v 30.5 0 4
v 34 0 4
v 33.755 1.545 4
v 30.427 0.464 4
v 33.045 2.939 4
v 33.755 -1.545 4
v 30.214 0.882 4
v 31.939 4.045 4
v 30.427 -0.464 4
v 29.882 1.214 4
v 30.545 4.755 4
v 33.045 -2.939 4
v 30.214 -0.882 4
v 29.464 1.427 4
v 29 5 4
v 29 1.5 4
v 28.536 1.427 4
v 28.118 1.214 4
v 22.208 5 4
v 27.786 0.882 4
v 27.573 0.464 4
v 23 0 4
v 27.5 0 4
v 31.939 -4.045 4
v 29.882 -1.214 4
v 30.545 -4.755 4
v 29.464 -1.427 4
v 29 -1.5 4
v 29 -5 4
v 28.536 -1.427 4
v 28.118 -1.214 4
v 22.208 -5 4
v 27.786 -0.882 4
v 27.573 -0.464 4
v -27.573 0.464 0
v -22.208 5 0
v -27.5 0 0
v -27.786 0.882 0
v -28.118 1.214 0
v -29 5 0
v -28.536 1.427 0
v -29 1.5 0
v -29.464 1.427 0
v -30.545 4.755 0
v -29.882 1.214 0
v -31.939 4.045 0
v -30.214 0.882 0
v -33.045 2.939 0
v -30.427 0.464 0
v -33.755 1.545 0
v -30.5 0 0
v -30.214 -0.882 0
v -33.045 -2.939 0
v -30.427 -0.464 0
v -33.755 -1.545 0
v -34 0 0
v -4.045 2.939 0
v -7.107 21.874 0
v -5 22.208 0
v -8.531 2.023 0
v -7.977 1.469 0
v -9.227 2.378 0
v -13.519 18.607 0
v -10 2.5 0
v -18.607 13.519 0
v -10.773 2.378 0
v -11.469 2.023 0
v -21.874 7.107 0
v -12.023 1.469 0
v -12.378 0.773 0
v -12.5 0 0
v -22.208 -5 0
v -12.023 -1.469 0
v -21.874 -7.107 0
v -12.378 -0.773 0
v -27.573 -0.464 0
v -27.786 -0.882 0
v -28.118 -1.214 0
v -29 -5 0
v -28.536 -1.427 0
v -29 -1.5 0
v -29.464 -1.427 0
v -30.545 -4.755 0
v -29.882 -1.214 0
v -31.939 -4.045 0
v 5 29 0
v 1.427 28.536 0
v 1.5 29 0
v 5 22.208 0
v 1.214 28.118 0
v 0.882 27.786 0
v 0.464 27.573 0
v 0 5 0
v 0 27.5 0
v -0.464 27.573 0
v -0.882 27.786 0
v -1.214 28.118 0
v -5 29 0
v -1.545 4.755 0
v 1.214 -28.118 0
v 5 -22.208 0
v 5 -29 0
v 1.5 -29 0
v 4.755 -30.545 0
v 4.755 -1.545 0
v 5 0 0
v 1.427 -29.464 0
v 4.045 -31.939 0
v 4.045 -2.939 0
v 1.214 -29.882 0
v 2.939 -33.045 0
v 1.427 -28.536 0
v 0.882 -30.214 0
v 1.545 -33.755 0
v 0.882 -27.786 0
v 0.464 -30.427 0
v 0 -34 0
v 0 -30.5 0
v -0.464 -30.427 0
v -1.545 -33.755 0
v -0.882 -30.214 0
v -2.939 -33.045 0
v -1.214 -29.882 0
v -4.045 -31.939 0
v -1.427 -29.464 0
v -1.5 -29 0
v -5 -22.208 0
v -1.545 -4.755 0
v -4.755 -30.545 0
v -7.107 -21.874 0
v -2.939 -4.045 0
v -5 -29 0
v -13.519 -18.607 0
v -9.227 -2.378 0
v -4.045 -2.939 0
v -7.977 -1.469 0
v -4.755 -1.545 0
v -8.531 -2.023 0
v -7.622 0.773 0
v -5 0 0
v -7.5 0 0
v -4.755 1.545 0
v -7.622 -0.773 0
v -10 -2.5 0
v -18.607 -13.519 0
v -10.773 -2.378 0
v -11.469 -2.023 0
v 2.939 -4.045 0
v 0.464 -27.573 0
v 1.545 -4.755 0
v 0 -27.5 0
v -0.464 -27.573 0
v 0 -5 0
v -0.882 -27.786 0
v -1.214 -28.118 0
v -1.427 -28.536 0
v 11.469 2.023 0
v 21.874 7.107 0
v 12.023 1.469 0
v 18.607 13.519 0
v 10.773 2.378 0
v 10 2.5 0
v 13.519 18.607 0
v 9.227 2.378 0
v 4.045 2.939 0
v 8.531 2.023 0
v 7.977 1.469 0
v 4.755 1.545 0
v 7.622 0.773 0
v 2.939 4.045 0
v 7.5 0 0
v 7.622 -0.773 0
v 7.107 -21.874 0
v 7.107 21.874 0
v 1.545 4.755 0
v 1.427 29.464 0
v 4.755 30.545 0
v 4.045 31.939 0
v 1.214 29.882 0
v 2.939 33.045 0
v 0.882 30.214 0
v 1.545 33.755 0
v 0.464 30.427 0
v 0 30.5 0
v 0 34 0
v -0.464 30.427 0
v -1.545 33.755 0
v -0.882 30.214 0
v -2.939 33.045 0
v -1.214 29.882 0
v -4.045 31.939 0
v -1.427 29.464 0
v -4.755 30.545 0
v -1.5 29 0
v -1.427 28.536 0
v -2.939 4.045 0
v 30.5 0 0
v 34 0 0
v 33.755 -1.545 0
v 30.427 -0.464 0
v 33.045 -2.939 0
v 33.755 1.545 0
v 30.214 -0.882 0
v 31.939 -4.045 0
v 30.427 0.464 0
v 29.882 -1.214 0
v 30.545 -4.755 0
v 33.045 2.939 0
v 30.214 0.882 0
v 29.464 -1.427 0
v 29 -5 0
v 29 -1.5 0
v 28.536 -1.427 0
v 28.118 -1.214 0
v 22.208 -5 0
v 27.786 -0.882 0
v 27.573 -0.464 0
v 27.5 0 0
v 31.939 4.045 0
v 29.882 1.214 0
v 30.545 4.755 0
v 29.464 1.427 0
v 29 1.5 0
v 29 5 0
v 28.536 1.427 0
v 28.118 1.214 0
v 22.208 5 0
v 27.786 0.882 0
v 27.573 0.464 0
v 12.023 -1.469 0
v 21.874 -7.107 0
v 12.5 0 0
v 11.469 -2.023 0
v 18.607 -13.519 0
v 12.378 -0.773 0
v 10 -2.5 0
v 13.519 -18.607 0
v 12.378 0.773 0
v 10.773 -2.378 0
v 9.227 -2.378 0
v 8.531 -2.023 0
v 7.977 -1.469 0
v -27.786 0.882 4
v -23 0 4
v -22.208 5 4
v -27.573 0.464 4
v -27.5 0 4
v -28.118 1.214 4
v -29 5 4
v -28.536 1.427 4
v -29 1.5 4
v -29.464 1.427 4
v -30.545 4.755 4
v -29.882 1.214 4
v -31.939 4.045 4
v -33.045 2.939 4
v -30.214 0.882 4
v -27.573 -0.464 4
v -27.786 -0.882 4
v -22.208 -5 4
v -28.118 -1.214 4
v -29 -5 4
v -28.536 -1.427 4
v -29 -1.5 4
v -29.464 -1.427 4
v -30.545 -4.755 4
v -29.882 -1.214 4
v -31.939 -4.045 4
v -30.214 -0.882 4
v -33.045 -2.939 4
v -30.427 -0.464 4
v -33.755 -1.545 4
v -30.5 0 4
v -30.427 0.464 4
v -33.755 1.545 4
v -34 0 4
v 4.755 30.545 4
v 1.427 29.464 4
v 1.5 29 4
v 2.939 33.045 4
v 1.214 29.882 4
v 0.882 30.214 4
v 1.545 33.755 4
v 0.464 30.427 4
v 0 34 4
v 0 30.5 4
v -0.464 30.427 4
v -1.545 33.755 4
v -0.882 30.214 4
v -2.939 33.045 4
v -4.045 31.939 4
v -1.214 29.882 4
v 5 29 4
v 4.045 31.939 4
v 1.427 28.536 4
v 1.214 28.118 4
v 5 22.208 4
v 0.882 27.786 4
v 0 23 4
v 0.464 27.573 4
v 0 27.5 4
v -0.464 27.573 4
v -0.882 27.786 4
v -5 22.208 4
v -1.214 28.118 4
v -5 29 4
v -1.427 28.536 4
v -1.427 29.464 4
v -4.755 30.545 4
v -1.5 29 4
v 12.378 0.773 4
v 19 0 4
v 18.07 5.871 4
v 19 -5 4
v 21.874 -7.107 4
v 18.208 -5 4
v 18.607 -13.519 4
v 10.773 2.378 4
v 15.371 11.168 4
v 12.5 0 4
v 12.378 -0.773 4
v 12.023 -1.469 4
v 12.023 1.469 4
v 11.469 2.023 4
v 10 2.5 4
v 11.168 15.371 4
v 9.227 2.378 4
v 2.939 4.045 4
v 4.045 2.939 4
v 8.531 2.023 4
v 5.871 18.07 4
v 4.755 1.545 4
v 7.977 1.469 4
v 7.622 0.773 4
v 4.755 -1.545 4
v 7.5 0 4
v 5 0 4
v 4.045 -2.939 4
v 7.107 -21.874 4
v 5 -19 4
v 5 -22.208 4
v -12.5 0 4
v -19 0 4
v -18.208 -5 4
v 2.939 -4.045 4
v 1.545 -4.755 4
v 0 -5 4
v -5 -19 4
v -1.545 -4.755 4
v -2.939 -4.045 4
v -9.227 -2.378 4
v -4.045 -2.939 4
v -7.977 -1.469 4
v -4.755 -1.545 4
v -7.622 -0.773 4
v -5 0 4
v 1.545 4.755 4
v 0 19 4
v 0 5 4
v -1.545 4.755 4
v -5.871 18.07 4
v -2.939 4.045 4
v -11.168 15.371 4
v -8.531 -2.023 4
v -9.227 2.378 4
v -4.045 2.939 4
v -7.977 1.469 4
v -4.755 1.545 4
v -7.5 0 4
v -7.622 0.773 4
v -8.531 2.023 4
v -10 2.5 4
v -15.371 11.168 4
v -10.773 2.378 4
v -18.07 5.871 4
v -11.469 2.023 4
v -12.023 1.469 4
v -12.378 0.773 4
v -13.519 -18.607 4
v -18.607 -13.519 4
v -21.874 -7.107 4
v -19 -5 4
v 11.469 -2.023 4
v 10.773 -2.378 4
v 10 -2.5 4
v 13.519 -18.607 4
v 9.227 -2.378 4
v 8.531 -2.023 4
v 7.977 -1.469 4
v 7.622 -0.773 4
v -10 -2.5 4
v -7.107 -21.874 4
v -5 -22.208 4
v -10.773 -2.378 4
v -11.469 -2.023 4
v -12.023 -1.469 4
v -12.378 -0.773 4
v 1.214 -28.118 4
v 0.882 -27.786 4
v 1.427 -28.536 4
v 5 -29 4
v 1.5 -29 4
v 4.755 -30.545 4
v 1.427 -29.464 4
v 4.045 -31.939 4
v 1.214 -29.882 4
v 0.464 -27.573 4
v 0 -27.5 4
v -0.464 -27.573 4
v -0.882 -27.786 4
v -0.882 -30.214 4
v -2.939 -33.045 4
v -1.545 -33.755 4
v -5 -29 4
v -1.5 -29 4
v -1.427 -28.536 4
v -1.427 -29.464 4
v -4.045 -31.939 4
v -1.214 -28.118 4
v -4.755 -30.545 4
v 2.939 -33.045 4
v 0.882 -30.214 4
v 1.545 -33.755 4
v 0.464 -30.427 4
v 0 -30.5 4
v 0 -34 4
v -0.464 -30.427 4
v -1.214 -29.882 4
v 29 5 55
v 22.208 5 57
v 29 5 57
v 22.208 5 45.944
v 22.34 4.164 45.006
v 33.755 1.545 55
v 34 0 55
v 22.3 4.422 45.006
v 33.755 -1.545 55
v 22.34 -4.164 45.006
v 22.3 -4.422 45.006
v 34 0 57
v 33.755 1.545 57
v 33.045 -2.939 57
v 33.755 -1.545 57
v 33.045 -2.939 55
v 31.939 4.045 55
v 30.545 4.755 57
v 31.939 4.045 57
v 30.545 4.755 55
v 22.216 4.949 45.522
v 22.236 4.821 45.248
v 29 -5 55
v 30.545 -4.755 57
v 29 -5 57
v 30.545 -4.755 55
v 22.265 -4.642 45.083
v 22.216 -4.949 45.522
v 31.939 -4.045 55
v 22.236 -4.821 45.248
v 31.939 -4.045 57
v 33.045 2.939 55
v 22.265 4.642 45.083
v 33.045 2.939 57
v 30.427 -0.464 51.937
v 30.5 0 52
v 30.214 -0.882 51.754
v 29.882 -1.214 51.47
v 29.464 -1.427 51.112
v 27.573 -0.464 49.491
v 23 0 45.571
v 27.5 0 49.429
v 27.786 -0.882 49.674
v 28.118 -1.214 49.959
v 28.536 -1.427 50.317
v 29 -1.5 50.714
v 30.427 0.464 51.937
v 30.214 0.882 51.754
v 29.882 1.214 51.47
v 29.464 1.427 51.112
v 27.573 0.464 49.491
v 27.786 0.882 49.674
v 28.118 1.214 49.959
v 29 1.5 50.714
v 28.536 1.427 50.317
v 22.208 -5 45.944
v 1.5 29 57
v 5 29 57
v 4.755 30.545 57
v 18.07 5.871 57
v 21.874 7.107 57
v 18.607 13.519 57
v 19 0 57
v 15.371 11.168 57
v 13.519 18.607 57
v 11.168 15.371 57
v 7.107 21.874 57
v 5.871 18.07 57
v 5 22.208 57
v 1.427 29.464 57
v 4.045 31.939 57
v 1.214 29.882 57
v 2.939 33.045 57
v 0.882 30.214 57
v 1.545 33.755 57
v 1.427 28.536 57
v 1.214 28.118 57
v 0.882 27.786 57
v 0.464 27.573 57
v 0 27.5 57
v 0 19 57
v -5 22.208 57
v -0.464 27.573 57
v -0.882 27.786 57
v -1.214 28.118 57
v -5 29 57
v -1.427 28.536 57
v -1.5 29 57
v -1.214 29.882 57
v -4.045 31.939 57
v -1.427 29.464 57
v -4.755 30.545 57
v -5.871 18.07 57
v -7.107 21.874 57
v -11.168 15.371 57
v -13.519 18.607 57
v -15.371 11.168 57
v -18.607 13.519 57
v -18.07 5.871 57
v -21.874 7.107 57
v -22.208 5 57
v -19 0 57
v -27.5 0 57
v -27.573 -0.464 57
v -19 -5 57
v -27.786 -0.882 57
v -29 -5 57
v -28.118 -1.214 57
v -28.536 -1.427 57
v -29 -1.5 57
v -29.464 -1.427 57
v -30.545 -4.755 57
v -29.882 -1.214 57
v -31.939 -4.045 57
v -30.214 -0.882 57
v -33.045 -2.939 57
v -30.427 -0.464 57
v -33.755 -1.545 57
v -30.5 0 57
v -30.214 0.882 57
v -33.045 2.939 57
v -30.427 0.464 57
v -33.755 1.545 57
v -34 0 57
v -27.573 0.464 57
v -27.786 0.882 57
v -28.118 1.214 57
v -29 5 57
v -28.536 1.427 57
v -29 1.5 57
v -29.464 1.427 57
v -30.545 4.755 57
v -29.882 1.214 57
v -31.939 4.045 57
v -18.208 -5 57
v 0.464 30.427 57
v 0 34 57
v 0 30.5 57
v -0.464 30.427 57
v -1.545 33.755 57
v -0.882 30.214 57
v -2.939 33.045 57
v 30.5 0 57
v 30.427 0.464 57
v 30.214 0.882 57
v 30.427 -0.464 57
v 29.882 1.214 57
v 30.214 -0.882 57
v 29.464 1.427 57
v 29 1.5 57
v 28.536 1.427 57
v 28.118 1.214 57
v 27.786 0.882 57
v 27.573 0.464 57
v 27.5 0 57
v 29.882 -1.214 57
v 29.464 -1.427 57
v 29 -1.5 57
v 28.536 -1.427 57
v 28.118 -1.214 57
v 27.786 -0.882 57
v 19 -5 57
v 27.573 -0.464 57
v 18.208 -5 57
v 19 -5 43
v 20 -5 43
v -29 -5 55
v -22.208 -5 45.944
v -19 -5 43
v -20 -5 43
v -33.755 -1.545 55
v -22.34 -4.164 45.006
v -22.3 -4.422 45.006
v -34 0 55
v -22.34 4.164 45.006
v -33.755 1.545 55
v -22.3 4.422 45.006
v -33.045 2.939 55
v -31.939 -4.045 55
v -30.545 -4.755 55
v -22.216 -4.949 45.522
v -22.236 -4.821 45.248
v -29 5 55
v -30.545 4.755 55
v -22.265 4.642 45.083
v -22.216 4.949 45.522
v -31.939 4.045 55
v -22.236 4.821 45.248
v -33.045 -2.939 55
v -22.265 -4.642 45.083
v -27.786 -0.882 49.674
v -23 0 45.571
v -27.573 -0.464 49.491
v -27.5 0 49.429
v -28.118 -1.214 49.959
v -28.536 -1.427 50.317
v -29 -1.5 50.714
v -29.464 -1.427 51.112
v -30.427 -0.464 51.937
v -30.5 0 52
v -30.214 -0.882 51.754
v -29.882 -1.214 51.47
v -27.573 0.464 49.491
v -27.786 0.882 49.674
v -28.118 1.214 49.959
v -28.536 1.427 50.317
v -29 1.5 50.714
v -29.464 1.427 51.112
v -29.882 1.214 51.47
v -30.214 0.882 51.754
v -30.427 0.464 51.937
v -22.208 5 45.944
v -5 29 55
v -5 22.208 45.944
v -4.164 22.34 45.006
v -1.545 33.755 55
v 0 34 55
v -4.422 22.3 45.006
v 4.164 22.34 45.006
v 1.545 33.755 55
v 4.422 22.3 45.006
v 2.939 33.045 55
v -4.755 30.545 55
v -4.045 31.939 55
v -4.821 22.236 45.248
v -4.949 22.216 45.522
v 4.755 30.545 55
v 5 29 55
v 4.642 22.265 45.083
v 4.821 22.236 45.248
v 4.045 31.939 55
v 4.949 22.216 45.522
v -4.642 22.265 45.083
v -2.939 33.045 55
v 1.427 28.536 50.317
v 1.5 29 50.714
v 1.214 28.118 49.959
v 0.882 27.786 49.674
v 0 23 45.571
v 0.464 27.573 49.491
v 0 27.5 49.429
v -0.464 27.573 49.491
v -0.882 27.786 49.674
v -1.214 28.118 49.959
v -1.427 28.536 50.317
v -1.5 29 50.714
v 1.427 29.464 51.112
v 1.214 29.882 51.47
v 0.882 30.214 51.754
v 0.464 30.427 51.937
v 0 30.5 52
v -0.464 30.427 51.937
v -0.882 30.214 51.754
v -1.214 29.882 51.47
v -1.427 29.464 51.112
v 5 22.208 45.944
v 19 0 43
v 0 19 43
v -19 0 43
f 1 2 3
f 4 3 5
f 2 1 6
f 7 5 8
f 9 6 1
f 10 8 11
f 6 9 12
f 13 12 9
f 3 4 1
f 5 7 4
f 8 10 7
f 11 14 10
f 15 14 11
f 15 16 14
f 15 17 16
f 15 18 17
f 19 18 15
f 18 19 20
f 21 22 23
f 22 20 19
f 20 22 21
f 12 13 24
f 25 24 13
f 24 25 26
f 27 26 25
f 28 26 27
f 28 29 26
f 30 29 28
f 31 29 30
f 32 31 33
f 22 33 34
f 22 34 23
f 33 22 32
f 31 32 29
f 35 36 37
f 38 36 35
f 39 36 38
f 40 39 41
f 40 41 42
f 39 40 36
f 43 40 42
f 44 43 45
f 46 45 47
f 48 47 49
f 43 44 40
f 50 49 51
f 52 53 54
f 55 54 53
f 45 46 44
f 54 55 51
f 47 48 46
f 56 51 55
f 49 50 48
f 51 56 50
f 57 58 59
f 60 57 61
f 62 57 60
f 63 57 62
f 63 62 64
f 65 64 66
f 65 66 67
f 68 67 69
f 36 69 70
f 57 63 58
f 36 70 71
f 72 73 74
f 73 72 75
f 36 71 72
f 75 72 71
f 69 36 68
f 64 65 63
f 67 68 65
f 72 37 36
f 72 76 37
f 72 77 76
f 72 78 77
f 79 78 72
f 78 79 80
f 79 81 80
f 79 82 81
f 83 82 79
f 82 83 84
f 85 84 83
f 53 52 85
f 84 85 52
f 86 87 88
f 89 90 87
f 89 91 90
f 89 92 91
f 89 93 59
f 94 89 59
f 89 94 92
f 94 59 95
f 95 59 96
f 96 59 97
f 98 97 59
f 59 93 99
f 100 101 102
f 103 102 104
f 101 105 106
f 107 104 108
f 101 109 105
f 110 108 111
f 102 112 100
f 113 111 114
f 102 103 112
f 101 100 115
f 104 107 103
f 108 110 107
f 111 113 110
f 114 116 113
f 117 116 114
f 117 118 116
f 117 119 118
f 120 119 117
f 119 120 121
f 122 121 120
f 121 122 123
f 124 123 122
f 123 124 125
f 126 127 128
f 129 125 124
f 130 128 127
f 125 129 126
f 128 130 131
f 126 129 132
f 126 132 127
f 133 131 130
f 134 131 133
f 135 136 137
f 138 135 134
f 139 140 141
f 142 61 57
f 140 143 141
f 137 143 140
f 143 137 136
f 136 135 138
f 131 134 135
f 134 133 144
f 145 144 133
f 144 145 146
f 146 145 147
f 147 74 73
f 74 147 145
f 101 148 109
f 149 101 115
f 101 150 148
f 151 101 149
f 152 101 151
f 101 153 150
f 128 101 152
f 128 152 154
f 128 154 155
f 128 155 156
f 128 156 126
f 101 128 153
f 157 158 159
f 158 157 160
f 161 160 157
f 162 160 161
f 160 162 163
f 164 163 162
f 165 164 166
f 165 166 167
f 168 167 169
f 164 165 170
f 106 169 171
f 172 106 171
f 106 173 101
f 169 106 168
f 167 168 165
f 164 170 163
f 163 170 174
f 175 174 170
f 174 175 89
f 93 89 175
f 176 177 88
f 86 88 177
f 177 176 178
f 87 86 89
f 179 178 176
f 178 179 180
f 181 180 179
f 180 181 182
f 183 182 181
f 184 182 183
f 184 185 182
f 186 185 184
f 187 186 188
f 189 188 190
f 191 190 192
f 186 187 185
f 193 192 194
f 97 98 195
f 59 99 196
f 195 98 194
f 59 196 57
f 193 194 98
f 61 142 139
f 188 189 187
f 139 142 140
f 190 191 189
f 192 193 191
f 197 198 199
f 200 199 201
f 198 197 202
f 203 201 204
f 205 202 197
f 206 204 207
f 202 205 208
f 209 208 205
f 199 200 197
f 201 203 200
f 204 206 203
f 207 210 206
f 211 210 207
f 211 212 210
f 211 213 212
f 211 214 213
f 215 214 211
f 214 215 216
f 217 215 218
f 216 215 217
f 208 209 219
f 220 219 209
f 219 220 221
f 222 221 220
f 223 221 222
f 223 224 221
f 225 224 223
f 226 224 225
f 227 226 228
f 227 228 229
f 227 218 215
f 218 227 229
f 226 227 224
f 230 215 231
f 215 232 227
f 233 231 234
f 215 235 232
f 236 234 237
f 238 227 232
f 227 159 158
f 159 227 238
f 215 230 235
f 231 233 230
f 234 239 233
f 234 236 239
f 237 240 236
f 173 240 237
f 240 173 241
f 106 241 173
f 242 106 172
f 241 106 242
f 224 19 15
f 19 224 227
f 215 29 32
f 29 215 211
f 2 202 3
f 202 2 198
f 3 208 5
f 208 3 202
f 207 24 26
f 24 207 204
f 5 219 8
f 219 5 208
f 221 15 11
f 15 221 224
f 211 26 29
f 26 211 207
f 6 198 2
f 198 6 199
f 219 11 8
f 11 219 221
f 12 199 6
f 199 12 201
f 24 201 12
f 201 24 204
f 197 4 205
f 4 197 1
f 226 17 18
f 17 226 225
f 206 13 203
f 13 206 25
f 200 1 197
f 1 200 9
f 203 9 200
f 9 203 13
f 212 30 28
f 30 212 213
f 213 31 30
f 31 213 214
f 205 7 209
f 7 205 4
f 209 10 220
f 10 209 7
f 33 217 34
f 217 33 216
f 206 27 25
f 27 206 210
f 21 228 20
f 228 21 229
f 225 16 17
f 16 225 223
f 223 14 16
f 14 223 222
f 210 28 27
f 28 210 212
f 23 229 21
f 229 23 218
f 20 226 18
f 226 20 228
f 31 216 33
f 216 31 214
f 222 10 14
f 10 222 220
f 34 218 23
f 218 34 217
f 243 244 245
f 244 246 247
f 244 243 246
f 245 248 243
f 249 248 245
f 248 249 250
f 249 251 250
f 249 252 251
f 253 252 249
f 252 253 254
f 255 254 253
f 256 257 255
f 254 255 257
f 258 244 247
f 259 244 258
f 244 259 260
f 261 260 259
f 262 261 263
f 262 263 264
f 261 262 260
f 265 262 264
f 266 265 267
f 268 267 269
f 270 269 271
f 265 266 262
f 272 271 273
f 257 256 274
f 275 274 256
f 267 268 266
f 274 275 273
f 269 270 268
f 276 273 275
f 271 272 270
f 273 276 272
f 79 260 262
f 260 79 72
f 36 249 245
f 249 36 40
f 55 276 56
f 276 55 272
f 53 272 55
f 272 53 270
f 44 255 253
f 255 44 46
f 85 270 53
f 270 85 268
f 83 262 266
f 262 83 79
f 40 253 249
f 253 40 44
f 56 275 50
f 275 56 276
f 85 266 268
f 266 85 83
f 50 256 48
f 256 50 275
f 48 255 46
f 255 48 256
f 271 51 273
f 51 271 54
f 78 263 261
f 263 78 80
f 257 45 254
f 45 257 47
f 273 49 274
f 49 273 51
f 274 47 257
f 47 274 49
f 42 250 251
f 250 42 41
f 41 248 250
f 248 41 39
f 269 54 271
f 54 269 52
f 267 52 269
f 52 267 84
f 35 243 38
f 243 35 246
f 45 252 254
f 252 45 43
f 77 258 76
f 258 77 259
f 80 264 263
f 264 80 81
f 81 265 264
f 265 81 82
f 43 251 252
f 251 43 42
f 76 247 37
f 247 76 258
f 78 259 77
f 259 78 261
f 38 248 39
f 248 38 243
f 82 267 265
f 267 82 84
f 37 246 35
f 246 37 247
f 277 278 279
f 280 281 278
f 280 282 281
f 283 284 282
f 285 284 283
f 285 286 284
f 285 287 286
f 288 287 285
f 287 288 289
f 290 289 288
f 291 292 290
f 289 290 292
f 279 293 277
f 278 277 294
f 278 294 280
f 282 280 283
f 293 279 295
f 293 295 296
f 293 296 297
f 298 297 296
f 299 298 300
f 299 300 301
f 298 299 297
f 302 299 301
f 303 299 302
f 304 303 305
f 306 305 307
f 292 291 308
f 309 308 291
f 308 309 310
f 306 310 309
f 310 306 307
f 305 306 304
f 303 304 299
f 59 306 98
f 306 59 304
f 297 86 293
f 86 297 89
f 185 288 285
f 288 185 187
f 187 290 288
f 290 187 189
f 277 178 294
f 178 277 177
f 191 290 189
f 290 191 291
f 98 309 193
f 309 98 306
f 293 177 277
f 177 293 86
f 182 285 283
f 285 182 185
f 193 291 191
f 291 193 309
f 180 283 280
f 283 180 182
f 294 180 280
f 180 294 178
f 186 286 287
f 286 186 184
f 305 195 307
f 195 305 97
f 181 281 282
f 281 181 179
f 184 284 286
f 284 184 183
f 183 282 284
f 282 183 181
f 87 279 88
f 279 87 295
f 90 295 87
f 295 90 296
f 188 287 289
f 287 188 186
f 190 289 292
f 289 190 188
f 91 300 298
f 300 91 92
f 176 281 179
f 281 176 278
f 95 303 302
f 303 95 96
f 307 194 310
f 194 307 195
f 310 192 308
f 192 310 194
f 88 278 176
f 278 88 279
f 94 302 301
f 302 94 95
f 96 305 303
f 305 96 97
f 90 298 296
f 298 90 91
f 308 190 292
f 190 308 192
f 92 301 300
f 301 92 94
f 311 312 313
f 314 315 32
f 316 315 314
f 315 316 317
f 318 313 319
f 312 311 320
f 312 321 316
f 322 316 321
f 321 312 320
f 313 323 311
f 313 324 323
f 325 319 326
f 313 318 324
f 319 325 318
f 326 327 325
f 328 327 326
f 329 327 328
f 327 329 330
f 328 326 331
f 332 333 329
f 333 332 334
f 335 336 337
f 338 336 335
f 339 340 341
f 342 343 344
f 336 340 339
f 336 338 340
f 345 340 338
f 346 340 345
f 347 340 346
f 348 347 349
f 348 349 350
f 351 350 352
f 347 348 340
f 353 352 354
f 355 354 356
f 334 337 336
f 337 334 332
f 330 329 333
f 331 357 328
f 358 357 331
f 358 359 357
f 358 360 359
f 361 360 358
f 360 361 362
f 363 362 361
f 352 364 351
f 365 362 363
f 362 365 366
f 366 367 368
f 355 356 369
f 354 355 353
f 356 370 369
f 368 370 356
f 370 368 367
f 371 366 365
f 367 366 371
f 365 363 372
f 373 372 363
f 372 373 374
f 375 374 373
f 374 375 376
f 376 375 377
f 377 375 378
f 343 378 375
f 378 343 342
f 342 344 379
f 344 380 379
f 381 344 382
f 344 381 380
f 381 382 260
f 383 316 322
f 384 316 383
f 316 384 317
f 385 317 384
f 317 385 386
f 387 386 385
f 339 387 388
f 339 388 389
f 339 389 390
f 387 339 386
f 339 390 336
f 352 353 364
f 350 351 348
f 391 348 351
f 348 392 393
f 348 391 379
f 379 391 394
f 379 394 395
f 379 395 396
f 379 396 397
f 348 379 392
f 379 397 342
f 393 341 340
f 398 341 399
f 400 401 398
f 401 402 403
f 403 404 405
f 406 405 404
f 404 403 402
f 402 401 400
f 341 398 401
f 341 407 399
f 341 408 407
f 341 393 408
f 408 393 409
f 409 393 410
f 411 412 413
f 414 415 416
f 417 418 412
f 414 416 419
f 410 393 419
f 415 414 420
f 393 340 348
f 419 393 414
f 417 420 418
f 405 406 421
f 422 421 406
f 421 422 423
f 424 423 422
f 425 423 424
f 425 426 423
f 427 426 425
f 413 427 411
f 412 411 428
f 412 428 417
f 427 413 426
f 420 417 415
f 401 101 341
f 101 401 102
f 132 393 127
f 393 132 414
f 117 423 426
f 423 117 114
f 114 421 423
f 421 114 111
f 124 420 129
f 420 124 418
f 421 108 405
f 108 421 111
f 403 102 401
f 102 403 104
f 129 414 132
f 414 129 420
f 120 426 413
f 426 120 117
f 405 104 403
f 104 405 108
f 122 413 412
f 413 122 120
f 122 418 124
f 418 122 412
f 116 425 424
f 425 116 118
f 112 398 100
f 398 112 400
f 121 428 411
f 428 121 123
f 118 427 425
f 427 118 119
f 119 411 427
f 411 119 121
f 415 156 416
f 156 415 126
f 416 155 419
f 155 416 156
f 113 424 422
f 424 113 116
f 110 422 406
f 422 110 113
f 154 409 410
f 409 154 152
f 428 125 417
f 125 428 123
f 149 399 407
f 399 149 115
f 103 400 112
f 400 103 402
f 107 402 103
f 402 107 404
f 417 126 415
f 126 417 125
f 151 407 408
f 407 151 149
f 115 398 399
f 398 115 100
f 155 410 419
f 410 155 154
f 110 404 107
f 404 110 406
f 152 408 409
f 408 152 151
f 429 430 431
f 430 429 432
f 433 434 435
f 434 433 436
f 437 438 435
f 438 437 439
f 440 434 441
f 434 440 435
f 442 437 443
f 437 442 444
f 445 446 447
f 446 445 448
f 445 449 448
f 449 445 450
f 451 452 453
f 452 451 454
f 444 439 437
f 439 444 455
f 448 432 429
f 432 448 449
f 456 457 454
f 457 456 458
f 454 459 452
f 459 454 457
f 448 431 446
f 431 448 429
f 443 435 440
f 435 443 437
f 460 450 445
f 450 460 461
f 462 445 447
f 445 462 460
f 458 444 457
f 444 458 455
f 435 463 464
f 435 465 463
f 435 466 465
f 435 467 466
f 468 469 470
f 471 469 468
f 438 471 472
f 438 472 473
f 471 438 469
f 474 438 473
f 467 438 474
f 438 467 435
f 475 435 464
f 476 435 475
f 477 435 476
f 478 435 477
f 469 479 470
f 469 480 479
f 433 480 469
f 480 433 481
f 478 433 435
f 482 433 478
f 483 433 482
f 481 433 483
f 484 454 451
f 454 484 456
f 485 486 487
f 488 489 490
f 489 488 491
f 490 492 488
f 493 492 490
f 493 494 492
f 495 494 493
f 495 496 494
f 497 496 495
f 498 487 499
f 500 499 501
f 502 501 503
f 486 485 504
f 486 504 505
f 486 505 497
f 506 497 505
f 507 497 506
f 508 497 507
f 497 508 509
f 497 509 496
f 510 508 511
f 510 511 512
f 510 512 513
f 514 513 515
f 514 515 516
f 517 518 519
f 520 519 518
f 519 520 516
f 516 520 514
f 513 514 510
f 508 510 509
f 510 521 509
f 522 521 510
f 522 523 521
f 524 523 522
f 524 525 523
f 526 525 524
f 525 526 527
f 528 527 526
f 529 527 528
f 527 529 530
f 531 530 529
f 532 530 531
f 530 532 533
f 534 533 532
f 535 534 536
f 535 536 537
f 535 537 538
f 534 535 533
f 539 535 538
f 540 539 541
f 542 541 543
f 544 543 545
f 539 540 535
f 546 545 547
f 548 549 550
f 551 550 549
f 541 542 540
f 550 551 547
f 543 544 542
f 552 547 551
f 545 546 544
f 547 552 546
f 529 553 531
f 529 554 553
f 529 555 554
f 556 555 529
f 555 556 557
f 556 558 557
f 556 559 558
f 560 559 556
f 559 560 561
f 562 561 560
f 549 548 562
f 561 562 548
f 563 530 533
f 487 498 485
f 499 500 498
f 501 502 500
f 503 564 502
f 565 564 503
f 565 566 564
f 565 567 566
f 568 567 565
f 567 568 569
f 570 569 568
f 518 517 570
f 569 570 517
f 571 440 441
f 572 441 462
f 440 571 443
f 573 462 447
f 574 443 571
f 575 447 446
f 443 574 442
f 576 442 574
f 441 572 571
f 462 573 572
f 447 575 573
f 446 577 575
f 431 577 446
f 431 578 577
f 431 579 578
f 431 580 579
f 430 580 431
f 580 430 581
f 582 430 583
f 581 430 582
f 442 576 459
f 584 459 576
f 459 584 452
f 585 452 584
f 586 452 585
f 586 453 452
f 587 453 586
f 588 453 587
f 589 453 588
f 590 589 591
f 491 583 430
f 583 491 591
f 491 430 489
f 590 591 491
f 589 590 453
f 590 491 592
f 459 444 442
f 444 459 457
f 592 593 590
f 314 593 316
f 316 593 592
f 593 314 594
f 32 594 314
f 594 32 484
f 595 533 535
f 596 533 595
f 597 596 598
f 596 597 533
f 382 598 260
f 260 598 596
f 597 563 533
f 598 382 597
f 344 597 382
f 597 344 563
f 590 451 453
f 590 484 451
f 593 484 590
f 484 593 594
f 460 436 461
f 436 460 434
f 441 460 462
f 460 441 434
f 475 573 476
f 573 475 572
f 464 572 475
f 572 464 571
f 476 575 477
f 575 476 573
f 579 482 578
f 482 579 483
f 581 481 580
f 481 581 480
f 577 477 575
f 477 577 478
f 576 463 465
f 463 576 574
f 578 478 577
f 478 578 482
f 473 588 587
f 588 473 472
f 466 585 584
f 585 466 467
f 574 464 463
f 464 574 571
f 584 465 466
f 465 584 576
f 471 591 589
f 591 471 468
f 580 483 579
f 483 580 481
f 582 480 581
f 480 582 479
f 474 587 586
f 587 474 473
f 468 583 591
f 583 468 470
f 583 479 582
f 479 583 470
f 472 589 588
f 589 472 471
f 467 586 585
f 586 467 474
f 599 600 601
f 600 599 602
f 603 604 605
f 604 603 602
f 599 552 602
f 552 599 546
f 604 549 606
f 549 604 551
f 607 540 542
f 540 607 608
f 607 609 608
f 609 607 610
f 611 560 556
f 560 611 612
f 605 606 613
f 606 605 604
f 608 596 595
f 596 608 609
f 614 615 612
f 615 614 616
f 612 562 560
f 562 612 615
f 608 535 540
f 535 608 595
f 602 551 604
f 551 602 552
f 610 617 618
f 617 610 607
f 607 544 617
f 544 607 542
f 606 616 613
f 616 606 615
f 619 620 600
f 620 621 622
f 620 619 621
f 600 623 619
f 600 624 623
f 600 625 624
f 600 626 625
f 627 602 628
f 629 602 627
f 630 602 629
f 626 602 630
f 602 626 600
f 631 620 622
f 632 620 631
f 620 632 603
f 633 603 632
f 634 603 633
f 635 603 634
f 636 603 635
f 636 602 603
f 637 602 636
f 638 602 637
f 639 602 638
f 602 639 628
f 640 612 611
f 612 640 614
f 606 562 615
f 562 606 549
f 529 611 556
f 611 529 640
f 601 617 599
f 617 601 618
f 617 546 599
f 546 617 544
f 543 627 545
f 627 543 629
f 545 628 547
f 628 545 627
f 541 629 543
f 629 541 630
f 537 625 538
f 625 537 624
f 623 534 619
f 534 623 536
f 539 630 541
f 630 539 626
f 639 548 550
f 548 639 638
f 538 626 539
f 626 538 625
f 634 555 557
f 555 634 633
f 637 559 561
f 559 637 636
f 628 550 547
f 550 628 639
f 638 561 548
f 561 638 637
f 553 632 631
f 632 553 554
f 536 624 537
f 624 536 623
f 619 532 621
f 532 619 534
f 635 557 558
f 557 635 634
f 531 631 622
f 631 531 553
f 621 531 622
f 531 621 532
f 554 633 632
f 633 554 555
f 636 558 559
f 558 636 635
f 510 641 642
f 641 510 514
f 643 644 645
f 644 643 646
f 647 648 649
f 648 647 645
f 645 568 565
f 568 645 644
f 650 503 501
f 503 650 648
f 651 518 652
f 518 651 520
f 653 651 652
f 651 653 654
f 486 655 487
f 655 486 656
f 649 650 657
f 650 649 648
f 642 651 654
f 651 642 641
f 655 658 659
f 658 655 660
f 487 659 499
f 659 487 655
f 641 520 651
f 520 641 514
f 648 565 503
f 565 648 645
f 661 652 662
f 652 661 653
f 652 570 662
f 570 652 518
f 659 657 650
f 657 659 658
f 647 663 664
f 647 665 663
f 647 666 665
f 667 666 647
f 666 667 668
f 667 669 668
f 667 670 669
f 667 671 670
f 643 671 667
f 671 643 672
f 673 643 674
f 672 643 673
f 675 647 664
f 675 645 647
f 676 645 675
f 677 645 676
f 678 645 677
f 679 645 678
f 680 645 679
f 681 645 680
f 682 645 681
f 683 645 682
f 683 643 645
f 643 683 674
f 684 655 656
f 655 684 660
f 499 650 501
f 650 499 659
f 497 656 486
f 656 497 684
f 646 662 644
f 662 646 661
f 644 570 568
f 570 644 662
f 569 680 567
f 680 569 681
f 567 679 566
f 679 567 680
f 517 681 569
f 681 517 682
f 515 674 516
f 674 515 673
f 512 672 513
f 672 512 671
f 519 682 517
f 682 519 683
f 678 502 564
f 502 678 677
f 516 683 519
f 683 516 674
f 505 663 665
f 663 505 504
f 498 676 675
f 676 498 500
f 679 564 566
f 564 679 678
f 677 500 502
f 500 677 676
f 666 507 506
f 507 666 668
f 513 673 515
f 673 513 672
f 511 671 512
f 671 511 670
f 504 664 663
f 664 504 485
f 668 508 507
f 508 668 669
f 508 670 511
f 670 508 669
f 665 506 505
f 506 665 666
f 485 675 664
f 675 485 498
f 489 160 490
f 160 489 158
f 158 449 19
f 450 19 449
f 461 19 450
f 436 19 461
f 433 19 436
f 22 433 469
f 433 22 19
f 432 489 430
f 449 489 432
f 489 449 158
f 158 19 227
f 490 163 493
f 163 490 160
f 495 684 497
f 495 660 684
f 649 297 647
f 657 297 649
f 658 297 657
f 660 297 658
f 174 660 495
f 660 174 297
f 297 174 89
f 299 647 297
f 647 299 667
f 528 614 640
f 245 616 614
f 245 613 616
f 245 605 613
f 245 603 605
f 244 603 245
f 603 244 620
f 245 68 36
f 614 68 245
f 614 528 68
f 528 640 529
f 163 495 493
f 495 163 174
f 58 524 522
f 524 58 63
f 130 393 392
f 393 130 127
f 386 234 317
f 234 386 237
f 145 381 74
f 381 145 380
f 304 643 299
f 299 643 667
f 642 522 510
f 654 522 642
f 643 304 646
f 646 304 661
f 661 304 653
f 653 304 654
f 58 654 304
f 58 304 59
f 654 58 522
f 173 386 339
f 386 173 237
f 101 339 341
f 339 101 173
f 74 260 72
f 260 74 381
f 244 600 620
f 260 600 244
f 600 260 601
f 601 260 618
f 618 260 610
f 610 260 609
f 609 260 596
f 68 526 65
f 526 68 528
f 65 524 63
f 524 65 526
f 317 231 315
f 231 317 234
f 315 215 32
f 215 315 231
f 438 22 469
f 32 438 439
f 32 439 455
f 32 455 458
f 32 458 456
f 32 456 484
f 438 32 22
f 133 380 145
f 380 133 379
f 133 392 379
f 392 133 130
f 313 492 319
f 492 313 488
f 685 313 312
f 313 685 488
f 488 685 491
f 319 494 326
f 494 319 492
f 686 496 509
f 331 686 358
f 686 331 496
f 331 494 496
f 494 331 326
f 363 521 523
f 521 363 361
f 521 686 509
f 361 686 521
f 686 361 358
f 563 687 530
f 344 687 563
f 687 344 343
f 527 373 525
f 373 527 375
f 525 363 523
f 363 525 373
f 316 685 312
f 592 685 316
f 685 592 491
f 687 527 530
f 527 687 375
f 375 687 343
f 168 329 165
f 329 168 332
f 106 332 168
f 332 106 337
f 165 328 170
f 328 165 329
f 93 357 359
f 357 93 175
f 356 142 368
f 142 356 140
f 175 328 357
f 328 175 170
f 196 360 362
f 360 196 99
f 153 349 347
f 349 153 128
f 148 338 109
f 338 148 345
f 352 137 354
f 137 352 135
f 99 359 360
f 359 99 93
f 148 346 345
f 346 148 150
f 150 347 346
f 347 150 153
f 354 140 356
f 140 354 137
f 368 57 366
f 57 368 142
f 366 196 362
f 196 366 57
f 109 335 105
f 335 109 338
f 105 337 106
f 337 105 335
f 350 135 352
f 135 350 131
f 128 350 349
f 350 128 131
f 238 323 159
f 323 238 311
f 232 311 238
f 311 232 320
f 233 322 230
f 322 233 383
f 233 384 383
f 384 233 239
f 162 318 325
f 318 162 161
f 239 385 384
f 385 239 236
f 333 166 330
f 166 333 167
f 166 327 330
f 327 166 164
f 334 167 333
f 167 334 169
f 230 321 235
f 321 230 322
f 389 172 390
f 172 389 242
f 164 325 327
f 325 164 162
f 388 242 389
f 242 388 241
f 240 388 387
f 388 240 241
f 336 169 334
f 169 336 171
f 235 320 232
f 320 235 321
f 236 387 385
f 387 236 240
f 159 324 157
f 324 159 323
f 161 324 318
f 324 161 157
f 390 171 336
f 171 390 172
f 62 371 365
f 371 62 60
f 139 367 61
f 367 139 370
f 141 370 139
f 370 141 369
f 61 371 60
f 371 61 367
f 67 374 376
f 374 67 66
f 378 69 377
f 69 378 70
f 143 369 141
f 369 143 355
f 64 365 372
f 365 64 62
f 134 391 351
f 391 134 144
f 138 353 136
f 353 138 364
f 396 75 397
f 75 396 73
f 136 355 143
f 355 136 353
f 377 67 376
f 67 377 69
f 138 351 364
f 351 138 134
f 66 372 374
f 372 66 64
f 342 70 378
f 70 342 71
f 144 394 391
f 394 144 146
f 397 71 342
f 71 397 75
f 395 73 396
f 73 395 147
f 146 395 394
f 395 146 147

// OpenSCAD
$fn = 20;

//bearing diameter
bd = 22;

//bearing height
bh = 7;

//bearing diameter give
bg = .5;

//motor diameter
md = 38;

//motor height
mh = 53;

//bearing inner diameter
bid = 8;

//bearing inner diameter give
bidg = .2;

//wall thickness
wth = 4;

//pulley height
ph = 6;

//pulley outer diameter
pod = 45;

//pulley inner diameter
pid = 40;

//screw hole diameter
shd = 3;


module shaft(length=70)
{
  translate([0,0,(sqrt(3)/2)*(bid-bidg)/2])
  rotate([90,0,0])
  cylinder(d=bid-bidg, h=length, $fn=6);
}

module motor_holder()
{
  translate([md/2,-5,0])
  tab();

  translate([-md/2,5,0])
  rotate(180)
  tab();

  translate([5,md/2,0])
  rotate(90)
  tab();

  translate([-5,-md/2,0])
  rotate(-90)
  tab();

  translate([md/2,-5,mh+wth])
  uptab();

  translate([-md/2,5,mh+wth])
  rotate(180)
  uptab();

  translate([5,md/2,mh+wth])
  rotate(90)
  uptab();


  //translate([0,-md/2-wth,0])
  //cube([120,md+wth*2,wth]);

  difference()
  {

  cylinder(d=md+wth*2, h=mh+wth);
  translate([0,0,wth])
  cylinder(d=md, h=mh+.1);

  translate([-md,-md-5,wth])
  cube([md*2,md,mh+2]);

  translate([0,0,-1])
  cylinder(d=10, h=10);

  translate([10,0,-1])
  cylinder(d=5, h=10);

  translate([-10,0,-1])
  cylinder(d=5, h=10);
  }

}

module pulley()
{
  difference()
  {
    union()
    {
      cylinder(d1=pod, d2=pid, h=ph/2);
      translate([0,0,ph/2])
      cylinder(d2=pod, d1=pid, h=ph/2);
    }

    translate([0,0,-.5])
    cylinder(d=bid, h=ph+1, $fn=6);
  }
}

module tab()
{

  difference()
  {
  union()
  {
  cube([10,10,wth]);
  translate([10,5,0])
  cylinder(d=10, h=wth);
  }

  translate([10,5,-1])
  cylinder(d=shd, h=wth*2);
  }
}

module uptab()
{
  translate([0,0,-.5*wth])
  difference()
  {
  hull()
  {
  scale([1,1,.5])
  tab();
  translate([0,0,-12])
  cube([1,10,1]);
  }

  translate([10,5,-7])
  cylinder(d=shd, h=15);
  }
}


module bearing_holder()
{
  translate([bd/2,-5,0])
  tab();

  translate([-bd/2,5,0])
  rotate([0,0,180])
  tab();
  difference()
  {
  cylinder(d=bd+wth*2, h=bh);
  translate([0,0,wth])
  cylinder(d=bd, h=bh+2);
  translate([0,0,-1])
  cylinder(d=bid+bidg, h=bh+2);
  }



}

//bearing_holder();
motor_holder();
//shaft();

//uptab();
//tab();

//translate([0,50,0])
//pulley();
